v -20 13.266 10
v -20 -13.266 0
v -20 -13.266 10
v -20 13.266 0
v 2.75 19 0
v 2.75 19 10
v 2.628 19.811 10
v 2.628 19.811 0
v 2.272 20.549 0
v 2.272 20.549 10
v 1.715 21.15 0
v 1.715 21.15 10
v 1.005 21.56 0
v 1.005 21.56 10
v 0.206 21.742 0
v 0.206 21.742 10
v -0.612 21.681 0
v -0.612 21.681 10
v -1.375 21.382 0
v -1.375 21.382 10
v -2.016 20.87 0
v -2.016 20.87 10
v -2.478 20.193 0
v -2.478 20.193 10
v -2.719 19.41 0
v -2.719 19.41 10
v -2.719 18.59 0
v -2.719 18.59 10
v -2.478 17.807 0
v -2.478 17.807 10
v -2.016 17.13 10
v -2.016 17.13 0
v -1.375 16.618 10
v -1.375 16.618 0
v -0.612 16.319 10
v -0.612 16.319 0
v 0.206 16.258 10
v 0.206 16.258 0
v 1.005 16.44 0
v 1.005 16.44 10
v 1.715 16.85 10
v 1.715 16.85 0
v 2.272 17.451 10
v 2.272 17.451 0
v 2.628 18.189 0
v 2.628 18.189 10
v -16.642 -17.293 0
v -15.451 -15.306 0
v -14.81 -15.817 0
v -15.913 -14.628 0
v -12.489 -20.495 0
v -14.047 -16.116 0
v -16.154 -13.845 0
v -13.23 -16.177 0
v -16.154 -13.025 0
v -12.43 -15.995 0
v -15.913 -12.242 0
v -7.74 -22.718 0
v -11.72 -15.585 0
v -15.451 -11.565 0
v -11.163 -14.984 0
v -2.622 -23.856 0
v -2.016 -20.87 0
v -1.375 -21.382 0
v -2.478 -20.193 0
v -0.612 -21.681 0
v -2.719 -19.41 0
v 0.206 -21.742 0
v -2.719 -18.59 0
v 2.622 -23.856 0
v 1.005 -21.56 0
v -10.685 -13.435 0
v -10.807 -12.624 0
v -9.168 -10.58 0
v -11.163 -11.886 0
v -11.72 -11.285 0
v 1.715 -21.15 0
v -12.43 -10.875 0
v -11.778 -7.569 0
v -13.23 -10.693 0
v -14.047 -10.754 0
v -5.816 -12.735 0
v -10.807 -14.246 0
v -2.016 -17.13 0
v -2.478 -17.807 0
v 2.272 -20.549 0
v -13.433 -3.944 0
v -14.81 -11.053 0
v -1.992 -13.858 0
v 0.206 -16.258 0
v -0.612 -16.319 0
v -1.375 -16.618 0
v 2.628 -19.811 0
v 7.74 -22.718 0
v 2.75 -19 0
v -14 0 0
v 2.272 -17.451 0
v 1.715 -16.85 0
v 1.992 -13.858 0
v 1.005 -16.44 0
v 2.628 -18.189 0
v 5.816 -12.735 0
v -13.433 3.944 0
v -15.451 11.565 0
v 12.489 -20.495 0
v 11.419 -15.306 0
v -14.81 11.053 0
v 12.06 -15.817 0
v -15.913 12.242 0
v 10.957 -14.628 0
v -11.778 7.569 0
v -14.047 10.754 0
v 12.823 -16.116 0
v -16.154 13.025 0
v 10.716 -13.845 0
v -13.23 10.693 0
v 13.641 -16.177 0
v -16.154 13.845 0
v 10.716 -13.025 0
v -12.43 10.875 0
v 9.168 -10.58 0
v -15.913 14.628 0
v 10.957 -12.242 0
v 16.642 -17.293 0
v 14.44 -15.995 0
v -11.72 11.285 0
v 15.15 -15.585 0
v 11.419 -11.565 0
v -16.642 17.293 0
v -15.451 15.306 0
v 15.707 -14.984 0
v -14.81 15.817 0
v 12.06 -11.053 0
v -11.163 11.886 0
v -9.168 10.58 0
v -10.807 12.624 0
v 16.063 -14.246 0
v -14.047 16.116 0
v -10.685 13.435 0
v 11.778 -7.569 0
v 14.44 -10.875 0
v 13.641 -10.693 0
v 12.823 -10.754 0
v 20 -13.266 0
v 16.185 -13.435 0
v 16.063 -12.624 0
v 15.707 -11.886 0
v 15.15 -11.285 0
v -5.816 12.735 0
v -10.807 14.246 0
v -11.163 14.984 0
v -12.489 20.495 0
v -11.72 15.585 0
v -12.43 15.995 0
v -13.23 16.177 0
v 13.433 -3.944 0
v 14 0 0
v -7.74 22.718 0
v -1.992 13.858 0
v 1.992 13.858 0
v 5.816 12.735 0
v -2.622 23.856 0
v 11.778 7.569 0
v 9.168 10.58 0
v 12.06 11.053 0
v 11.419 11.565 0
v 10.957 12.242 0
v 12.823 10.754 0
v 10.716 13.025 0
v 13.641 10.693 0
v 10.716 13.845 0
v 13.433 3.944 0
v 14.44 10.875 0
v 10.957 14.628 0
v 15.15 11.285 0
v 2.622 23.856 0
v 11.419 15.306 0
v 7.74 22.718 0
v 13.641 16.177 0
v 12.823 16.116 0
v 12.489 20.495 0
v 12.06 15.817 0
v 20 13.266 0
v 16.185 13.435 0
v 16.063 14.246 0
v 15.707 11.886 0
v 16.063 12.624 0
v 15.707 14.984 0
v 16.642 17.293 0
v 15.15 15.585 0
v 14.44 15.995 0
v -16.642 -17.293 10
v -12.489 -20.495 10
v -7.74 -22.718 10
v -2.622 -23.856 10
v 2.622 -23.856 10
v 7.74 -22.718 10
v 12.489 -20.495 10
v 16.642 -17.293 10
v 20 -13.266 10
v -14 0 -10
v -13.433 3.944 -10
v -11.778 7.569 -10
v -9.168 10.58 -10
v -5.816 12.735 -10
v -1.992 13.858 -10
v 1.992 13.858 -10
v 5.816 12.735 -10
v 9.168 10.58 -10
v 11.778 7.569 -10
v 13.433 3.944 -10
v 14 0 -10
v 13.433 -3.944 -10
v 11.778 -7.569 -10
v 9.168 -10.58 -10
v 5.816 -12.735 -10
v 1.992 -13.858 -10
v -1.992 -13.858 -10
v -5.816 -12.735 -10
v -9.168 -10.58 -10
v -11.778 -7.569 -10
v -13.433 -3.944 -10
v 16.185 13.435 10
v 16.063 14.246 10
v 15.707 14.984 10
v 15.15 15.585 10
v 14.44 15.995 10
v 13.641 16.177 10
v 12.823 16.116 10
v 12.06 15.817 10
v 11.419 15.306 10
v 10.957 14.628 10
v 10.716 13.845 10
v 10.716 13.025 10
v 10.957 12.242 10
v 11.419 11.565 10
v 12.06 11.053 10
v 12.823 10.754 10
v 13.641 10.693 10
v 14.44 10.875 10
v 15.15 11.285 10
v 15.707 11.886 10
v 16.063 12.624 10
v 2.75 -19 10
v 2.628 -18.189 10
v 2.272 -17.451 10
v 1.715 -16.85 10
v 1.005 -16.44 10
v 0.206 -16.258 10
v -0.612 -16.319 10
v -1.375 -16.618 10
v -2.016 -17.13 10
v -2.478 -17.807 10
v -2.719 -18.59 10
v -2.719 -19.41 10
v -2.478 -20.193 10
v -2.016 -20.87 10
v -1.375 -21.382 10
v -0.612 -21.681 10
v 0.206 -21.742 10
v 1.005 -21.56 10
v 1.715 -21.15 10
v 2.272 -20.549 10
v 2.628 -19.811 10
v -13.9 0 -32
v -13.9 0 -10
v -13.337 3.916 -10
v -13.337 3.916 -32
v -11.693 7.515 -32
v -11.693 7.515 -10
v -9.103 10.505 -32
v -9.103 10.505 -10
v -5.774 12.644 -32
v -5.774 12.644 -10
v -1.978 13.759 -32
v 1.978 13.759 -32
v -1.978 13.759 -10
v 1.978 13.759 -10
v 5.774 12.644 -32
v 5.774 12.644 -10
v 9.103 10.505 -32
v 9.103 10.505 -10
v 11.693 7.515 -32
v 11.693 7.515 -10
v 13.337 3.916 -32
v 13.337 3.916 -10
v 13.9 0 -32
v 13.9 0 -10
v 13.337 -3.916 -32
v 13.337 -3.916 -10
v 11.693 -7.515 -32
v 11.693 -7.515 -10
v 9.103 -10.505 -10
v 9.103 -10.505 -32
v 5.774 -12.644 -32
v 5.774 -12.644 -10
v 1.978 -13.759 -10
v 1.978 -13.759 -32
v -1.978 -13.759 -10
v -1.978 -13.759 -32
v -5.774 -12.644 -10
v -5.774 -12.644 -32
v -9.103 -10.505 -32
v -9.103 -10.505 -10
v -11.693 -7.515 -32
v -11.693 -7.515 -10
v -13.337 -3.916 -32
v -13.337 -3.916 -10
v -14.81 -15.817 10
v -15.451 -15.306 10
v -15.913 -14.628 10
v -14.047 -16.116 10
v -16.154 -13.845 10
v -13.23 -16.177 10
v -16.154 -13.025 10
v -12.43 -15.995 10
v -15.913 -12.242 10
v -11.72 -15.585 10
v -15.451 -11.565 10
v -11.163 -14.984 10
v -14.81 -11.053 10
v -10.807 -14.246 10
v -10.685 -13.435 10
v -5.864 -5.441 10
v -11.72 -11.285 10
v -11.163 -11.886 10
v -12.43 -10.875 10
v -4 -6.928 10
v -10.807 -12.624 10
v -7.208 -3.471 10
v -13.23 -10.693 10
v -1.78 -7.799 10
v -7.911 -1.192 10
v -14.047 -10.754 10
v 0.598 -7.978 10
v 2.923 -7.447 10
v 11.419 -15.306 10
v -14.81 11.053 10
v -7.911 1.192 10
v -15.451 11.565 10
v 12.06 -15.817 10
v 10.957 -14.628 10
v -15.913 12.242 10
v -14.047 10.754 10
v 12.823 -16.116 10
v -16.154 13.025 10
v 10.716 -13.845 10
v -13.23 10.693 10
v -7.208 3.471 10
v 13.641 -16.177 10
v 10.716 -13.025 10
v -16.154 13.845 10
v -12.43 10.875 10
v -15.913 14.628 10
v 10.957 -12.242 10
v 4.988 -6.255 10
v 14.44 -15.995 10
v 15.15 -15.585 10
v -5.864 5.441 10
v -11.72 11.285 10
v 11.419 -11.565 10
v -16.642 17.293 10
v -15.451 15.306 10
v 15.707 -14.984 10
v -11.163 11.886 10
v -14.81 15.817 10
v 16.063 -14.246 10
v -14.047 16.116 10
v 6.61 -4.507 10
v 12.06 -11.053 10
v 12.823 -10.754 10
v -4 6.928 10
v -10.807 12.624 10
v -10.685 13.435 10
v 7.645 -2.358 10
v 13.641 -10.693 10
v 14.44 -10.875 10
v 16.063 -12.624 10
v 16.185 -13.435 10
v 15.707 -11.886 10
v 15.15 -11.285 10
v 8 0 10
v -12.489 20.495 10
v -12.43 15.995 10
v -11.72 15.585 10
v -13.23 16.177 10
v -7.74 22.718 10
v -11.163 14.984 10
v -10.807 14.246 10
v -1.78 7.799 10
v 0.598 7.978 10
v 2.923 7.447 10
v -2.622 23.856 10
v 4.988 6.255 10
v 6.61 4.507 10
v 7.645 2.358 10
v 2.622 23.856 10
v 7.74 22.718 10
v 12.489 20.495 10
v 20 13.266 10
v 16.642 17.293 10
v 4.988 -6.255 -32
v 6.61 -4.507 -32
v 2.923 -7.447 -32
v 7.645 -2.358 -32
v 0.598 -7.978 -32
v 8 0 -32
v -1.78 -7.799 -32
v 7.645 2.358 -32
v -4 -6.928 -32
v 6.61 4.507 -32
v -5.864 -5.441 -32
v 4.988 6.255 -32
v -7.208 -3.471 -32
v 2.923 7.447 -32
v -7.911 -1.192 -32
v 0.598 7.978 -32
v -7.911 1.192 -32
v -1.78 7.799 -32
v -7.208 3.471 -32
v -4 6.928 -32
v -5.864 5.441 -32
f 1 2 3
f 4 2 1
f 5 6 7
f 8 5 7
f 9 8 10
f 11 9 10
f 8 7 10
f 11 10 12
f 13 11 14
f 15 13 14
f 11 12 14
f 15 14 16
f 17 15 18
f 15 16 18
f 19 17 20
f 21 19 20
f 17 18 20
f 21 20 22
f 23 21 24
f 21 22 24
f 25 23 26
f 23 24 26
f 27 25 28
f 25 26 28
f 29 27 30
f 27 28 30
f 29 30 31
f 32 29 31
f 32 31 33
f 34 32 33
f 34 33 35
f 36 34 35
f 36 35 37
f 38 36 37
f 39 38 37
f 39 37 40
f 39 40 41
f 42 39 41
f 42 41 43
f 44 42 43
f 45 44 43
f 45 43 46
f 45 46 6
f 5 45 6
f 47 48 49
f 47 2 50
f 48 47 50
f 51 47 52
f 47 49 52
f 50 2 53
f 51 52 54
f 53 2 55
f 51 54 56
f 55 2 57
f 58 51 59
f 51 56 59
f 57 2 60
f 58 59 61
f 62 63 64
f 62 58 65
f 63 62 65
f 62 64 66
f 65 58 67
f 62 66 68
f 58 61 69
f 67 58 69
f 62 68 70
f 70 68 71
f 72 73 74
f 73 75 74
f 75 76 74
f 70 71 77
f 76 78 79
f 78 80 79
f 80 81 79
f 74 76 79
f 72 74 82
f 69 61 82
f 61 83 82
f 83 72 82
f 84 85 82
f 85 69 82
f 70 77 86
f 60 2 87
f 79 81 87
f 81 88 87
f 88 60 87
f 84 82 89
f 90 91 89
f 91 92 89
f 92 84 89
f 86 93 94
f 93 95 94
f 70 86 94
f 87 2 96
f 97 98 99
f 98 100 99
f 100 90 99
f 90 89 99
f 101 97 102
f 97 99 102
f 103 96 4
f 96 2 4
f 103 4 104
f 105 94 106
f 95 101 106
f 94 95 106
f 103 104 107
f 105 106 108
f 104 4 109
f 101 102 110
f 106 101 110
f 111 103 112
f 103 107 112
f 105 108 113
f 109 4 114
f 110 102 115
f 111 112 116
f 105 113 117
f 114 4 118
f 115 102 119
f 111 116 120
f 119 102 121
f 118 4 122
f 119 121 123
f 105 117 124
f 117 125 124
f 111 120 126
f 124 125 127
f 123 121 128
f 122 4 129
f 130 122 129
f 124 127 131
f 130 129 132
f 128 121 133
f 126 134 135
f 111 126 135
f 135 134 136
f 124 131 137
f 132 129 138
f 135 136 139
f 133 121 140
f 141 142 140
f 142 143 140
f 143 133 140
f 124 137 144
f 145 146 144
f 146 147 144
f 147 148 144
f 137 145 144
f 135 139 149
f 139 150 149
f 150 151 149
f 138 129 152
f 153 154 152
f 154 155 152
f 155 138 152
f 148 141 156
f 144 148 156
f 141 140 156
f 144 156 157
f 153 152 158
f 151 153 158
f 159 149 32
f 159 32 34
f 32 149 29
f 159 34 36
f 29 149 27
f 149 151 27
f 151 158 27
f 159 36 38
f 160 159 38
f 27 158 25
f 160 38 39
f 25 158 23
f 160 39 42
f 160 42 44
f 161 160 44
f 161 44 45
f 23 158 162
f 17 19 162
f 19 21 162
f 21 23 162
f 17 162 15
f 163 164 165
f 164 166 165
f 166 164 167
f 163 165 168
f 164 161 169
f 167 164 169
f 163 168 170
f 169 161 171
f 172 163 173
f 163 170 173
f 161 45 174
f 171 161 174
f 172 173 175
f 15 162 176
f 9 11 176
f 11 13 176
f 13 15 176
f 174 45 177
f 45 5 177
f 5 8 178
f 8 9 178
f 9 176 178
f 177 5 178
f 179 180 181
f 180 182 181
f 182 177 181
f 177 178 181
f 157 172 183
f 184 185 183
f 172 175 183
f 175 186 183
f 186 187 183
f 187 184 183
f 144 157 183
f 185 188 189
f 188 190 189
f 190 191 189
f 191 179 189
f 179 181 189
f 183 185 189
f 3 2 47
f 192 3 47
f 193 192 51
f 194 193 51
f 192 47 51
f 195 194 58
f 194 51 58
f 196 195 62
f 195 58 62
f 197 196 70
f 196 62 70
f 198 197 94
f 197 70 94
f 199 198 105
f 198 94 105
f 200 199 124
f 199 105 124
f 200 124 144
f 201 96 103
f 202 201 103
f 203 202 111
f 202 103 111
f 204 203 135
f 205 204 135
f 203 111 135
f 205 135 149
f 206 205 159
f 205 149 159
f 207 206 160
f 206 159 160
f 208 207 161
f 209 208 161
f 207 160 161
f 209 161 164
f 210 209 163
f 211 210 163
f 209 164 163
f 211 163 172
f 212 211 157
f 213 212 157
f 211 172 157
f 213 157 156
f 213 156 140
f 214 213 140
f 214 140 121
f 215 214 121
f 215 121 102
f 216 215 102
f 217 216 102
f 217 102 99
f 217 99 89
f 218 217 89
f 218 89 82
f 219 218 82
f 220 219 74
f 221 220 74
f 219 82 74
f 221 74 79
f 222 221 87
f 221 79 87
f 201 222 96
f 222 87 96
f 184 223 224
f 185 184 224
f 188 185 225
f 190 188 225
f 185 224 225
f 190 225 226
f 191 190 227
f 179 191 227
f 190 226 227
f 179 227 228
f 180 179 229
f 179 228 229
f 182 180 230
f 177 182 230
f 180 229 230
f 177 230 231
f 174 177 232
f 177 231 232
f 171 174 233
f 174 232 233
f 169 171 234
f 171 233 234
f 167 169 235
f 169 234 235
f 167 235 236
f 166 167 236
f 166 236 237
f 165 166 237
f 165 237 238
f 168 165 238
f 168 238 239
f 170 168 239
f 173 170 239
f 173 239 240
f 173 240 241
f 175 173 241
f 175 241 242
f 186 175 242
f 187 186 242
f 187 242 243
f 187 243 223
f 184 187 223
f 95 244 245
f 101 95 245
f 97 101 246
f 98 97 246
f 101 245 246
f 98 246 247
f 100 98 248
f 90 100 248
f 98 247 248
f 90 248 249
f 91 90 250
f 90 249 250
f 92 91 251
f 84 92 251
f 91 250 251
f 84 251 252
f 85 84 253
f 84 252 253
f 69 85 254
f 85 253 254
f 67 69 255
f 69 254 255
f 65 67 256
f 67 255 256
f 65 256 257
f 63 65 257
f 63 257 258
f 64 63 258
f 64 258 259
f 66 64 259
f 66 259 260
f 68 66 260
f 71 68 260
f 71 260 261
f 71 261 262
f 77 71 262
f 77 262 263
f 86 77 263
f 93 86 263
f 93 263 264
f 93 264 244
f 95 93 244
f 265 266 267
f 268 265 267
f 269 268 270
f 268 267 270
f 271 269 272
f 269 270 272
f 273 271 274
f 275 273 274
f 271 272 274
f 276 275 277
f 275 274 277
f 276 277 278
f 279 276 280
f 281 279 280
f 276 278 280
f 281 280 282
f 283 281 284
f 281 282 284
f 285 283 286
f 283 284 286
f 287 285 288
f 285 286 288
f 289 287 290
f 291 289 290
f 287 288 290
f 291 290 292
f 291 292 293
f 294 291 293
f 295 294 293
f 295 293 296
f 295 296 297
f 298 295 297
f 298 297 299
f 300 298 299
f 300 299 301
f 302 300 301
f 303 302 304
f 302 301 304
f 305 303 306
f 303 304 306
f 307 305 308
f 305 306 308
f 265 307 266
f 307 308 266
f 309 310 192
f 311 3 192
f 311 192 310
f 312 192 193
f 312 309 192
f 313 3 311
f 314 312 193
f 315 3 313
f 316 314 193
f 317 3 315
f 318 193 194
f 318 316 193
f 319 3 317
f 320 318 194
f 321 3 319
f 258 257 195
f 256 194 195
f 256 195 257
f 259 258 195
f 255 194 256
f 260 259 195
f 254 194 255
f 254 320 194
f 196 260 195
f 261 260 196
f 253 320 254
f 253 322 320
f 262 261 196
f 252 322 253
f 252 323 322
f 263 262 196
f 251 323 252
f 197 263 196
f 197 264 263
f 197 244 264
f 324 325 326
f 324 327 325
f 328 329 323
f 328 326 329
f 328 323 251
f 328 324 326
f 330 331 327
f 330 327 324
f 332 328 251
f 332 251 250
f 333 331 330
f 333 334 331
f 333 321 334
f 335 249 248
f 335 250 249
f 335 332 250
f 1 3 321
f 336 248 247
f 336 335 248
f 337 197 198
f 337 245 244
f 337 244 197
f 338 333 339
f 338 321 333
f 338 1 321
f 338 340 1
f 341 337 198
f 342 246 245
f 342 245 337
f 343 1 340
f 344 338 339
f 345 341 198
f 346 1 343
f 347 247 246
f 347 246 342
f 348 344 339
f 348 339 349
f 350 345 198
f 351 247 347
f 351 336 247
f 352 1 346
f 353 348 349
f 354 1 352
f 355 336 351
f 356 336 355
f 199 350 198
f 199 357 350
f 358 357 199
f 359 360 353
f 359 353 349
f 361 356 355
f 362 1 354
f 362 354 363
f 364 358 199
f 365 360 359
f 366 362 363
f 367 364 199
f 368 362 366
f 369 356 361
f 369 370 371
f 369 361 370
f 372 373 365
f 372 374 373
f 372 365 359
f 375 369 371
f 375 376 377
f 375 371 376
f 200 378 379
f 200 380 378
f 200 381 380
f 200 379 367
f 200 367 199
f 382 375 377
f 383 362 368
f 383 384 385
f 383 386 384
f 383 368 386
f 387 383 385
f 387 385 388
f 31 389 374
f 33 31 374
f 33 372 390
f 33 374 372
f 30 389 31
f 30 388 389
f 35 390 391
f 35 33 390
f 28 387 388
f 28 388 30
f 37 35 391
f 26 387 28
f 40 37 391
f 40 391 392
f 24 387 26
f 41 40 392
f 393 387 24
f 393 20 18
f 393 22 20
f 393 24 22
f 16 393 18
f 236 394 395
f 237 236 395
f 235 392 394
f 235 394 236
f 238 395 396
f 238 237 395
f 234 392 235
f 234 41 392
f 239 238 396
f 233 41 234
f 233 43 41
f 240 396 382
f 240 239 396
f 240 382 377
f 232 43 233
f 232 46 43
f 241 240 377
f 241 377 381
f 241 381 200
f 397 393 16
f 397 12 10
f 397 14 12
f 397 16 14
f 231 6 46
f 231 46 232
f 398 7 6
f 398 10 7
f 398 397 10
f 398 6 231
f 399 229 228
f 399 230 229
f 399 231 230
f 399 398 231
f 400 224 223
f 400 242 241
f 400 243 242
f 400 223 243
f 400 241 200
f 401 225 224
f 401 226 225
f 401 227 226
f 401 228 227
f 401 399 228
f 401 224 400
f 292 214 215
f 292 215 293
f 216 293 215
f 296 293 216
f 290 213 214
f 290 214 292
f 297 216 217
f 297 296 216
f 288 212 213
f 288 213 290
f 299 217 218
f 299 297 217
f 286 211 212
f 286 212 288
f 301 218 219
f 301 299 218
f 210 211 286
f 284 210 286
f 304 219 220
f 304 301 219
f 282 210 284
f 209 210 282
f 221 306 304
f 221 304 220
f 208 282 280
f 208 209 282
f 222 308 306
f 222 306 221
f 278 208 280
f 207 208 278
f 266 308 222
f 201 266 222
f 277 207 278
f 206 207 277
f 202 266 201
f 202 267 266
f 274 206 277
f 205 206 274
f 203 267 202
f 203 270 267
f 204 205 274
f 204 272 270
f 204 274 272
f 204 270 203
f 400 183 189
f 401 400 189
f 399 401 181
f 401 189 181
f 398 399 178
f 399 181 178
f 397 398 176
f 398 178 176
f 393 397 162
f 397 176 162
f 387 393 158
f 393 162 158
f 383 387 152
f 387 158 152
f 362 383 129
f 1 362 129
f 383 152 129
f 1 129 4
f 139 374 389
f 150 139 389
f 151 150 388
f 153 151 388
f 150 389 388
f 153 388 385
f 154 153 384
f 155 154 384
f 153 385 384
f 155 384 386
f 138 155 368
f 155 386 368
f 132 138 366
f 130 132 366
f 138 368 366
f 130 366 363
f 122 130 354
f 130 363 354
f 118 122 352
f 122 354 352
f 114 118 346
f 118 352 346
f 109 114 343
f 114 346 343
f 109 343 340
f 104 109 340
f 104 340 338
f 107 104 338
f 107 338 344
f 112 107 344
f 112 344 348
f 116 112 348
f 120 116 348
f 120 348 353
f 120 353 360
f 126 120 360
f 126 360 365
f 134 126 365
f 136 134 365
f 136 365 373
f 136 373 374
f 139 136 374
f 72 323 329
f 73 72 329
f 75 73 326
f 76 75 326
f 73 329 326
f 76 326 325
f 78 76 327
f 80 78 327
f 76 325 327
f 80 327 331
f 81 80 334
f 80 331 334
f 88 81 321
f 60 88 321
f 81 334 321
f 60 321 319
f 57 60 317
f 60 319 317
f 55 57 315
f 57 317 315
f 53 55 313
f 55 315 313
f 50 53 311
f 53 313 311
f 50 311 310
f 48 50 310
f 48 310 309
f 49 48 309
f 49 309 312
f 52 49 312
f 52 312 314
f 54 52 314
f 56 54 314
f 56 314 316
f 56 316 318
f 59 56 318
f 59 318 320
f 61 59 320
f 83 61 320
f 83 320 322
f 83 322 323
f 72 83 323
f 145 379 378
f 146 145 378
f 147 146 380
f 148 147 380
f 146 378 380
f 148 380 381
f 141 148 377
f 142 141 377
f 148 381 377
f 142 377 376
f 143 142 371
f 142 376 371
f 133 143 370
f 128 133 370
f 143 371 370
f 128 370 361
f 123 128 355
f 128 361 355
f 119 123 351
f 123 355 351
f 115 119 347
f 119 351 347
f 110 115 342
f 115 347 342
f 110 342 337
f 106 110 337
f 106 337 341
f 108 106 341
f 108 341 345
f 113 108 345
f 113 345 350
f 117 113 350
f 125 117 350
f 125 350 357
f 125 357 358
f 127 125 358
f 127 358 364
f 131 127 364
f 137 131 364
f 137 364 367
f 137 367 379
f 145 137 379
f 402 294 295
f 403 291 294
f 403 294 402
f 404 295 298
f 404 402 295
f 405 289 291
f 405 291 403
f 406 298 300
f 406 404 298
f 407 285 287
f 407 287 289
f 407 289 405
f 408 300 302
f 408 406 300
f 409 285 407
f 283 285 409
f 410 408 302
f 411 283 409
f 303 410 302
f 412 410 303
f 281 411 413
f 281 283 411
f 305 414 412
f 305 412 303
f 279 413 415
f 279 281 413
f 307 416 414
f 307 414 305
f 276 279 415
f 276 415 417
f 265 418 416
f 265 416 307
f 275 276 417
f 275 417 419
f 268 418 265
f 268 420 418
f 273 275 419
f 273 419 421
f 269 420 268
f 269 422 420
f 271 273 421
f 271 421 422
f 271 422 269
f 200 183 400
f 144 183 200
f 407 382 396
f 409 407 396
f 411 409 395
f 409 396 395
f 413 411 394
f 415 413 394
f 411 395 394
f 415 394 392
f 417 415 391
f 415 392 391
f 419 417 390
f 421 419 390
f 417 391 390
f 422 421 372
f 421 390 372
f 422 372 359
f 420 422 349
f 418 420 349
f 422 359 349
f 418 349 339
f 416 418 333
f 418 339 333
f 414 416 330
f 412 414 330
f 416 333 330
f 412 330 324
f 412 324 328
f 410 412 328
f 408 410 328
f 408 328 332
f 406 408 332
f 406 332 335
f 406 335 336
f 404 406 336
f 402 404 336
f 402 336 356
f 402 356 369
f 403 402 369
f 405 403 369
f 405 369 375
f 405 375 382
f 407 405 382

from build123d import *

# Parameters (mm, degrees)
SKETCH_1_R          = 24
EXTRUDE_1_DEPTH     = 10
SKETCH_2_R          = 14
EXTRUDE_2_DEPTH     = 10
SKETCH_3_R          = 13.9
EXTRUDE_3_DEPTH     = 22
CUT_EXTRUDE_START   = -22
CUT_EXTRUDE_1_DEPTH = 22
SKETCH_5_R          = 2.75
CUT_EXTRUDE_2_DEPTH = 22
SKETCH_6_R          = 8
CUT_EXTRUDE_3_DEPTH = 53.345009313


with BuildPart() as part:
    # 스케치1 → 보스-돌출1 (new body)
    with BuildSketch(Plane.XY):
        Circle(SKETCH_1_R)
    extrude(amount=EXTRUDE_1_DEPTH)

    # 스케치2 → 보스-돌출2 (add)
    with BuildSketch(Plane(origin=(0, 0, 0), x_dir=(-1, 0, 0), z_dir=(0, 0, -1))):
        Circle(SKETCH_2_R)
    extrude(amount=EXTRUDE_2_DEPTH)

    # 스케치3 → 보스-돌출3 (add)
    with BuildSketch(Plane(origin=(0, 0, -10), x_dir=(-1, 0, 0), z_dir=(0, 0, -1))):
        Circle(SKETCH_3_R)
    extrude(amount=EXTRUDE_3_DEPTH)

    # 스케치4 → 컷-돌출1 (cut)
    with BuildSketch(Plane.XY.offset(10).offset(CUT_EXTRUDE_START)):
        with BuildLine():
            ThreePointArc((24, 0), (22.978250586, 6.92820323), (20, 13.266499161))
            Line((20, 13.266499161), (20, -13.266499161))
            ThreePointArc((20, -13.266499161), (22.978250586, -6.92820323), (24, 0))
        make_face()
        with BuildLine():
            Line((-20, -13.266499161), (-20, 13.266499161))
            ThreePointArc((-20, 13.266499161), (-24, 0), (-20, -13.266499161))
        make_face()
    extrude(amount=CUT_EXTRUDE_1_DEPTH, mode=Mode.SUBTRACT)

    # 스케치5 → 컷-돌출2 (cut)
    with BuildSketch(Plane.XY.offset(10)):
        with Locations((0, 19)):
            Circle(SKETCH_5_R)
        with Locations((-13.435028843, 13.435028843)):
            Circle(SKETCH_5_R)
        with Locations((13.435028843, 13.435028843)):
            Circle(SKETCH_5_R)
        with Locations((13.435028843, -13.435028843)):
            Circle(SKETCH_5_R)
        with Locations((0, -19)):
            Circle(SKETCH_5_R)
        with Locations((-13.435028843, -13.435028843)):
            Circle(SKETCH_5_R)
    extrude(amount=-CUT_EXTRUDE_2_DEPTH, mode=Mode.SUBTRACT)

    # 스케치6 → 컷-돌출3 (cut, through all)
    with BuildSketch(Plane.XY.offset(10)):
        Circle(SKETCH_6_R)
    extrude(amount=-CUT_EXTRUDE_3_DEPTH, mode=Mode.SUBTRACT)


solid = part.part
